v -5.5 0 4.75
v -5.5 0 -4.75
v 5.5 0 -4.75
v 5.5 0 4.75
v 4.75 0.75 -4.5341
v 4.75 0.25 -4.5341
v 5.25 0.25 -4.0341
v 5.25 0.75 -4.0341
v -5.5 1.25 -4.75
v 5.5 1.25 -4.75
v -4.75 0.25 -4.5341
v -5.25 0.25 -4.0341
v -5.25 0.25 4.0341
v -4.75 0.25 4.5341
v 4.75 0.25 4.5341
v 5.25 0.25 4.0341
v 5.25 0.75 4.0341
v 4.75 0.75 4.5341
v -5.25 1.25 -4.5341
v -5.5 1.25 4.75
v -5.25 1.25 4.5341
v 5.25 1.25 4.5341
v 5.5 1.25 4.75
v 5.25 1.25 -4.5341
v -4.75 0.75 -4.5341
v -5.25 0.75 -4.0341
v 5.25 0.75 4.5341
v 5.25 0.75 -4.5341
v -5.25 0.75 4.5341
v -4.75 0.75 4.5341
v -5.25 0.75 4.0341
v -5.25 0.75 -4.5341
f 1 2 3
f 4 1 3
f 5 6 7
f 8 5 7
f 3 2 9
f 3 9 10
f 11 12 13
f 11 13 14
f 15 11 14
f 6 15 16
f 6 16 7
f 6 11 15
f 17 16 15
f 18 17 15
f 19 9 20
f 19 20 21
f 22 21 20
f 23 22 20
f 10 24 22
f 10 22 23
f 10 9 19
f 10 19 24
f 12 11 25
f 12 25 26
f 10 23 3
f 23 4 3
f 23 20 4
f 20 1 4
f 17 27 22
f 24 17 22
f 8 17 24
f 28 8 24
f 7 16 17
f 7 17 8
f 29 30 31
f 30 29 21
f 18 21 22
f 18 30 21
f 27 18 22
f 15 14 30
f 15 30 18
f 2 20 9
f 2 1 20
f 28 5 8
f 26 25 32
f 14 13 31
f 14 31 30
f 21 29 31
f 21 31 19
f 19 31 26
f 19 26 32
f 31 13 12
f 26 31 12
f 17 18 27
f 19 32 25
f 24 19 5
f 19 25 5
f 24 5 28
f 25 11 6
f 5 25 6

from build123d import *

# Parameters (mm, degrees)
SKETCH_1_W      = 11
SKETCH_1_H      = 9.5
EXTRUDE_1_DEPTH = 0.25
SKETCH_2_W      = 11
SKETCH_2_H      = 9.5
SKETCH_2_W_2    = 10.5
SKETCH_2_H_2    = 9.068181818
EXTRUDE_2_DEPTH = 1
EXTRUDE_3_DEPTH = 0.5


with BuildPart() as part:
    # Эскиз1 → Бобышка-Вытянуть1 (new body)
    with BuildSketch(Plane(origin=(0, 0, 0), x_dir=(1, 0, 0), z_dir=(0, 1, 0))):
        Rectangle(SKETCH_1_W, SKETCH_1_H)
    extrude(amount=EXTRUDE_1_DEPTH)

    # Эскиз2 → Бобышка-Вытянуть2 (add)
    with BuildSketch(Plane(origin=(0, 0.25, 0), x_dir=(1, 0, 0), z_dir=(0, 1, 0))):
        Rectangle(SKETCH_2_W, SKETCH_2_H)
        Rectangle(SKETCH_2_W_2, SKETCH_2_H_2, mode=Mode.SUBTRACT)
    extrude(amount=EXTRUDE_2_DEPTH)

    # Эскиз3 → Бобышка-Вытянуть3 (add)
    with BuildSketch(Plane(origin=(0, 0.25, 0), x_dir=(1, 0, 0), z_dir=(0, 1, 0))):
        Polygon((-5.25, 4.534090909), (-4.75, 4.534090909), (-5.25, 4.034090909), align=None)
        Polygon((-5.25, -4.534090909), (-5.25, -4.034090909), (-4.75, -4.534090909), align=None)
        Polygon((5.25, -4.534090909), (5.25, -4.034090909), (4.75, -4.534090909), align=None)
        Polygon((4.75, 4.534090909), (5.25, 4.034090909), (5.25, 4.534090909), align=None)
    extrude(amount=EXTRUDE_3_DEPTH)


solid = part.part
